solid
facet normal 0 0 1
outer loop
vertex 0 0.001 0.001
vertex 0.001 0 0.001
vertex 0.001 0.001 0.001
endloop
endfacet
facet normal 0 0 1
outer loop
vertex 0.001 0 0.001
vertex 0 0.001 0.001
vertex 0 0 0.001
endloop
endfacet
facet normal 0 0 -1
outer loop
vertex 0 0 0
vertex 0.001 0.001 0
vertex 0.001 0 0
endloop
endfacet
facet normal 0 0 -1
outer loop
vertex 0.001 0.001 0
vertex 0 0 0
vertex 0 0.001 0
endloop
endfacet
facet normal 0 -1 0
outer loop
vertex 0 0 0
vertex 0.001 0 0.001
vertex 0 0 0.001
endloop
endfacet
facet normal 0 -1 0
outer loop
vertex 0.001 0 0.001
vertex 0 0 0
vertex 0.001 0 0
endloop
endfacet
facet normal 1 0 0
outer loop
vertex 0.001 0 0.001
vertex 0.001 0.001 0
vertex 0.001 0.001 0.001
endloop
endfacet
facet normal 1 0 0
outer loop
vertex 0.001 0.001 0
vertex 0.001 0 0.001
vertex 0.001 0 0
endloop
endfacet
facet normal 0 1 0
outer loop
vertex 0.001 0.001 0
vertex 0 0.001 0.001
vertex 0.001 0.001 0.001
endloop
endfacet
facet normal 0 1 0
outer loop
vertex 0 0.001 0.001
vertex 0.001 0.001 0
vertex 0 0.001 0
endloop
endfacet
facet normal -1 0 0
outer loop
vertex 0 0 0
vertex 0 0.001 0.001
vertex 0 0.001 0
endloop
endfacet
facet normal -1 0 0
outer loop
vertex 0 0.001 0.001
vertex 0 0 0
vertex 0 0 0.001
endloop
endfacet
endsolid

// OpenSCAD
// t_curve — the parametric frontend, and the dedupe that keeps it finite.

use <../src/uniTube.scad>;

// ============================================ a helix
R = 60;
T = 2;
RISE = 40;
h = ut_curve(function(t) [R * cos(360 * T * t), R * sin(360 * T * t), RISE * T * t], n=160);

assert(len(ut_segs(h)) == 1, "a parametric curve lowers to ONE sampled segment");
assert(ut_seg_kind(ut_segs(h)[0]) == "P", "of kind P");

// A sampled segment measures CHORDS, so it under-reads the true arclength. That
// is the honest cost of an arc-native IR and it is documented, not hidden.
true_len = sqrt(pow(2 * PI * R * T, 2) + pow(RISE * T, 2));
assert(ut_length(h) < true_len, "chords are shorter than the curve");
assert((true_len - ut_length(h)) / true_len < 0.001, str("but within 0.1% at n=160: ", ut_length(h), " vs ", true_len));

// ============================================ MANDATORY dedupe
// Two coincident consecutive samples make the tangent [0,0,0], and normalising
// that is [nan,nan,nan]. This is the exact failure in path_extrude.scad:58, and
// it fires on the most obvious thing a user does: joining two pieces that share
// an endpoint.
flat = ut_curve(function(t) [t < 0.5 ? 20 * t : 10, 0, 0], n=20);
assert(abs(ut_length(flat) - 10) < 1e-9, str("the repeated tail collapses to one point, got ", ut_length(flat)));
fsts = ut_stations(flat);
assert(
    min([for (i = [0:len(fsts) - 2]) norm(ut_st_p(fsts[i + 1]) - ut_st_p(fsts[i]))]) > 1e-9,
    "STATION-1: no duplicate stations survive"
);
assert(max([for (s = fsts) is_num(ut_st_t(s)[0]) ? 0 : 1]) == 0, "and no tangent is NaN");

// ============================================ exact tangents when dfdt is given
// ONLY the direction of dfdt is used, but the RELATIVE SCALING of its components
// matters: OpenSCAD trig is in DEGREES, so d/dt cos(360*k*t) = -2*PI*k*sin(...).
// Dropping the 2*PI leaves every tangent ~6 degrees out while looking plausible.
he = ut_curve(
    function(t) [R * cos(360 * T * t), R * sin(360 * T * t), RISE * T * t],
    dfdt=function(t) [-2 * PI * T * R * sin(360 * T * t), 2 * PI * T * R * cos(360 * T * t), RISE * T], n=160
);
ae = ut_stations(he);
ac = ut_stations(h);
m = floor(len(ae) / 2);

// IN THE INTERIOR central differences are second-order accurate and agree with
// the analytic tangent almost exactly -- measured 0.006 deg at n=160.
assert(
    ut_turn(ut_st_t(ae[m]), ut_st_t(ac[m])) < 0.05,
    str("interior tangents should agree closely, got ", ut_turn(ut_st_t(ae[m]), ut_st_t(ac[m])))
);

// AT THE ENDS a two-point chord would be FIRST order -- its error is about half
// a sample's rotation (2.24 deg at n=160 here). _ut_central uses a THREE-POINT
// one-sided difference instead, which is second order like the interior.
// Measured: 8.949 -> 0.460 at n=40, 2.237 -> 0.0141 at n=160.
err0 = ut_turn(ut_st_t(ae[0]), ut_st_t(ac[0]));
assert(err0 < 0.05, str("the END tangent must be second order too, got ", err0, " deg"));

// And it really is second order: quartering n's step should quarter... quarter
// the error. Compare n=80 against n=160 on the same curve.
c80 = ut_stations(ut_curve(function(t) [R * cos(360 * T * t), R * sin(360 * T * t), RISE * T * t], n=80));
e80 = ut_turn(ut_st_t(c80[0]), ut_st_t(ae[0]));
assert(e80 > err0 * 3, str("halving n should roughly quadruple the end error; got ", e80, " vs ", err0));

// WHICH IS WHY dfdt MATTERS MOST FOR PORTS. STATION-3 wants exact terminal
// tangents, and a port frame 2.2 degrees out is ~0.8 mm of gap across a 20 mm
// flange. On a sampled path, supplying dfdt is how you get that back.
assert(abs(ut_st_t(ae[0])[0]) < 1e-9, "with dfdt the start tangent is exact: no X component at t=0");

// ============================================ frames over a sampled path
assert(max([for (s = ut_stations(h)) abs(ut_st_t(s) * ut_st_n(s))]) < 1e-9, "frames stay orthonormal");
assert(max([for (s = ut_stations(h)) abs(norm(ut_st_n(s)) - 1)]) < 1e-9, "and unit");

cube(0.001); // sentinel
